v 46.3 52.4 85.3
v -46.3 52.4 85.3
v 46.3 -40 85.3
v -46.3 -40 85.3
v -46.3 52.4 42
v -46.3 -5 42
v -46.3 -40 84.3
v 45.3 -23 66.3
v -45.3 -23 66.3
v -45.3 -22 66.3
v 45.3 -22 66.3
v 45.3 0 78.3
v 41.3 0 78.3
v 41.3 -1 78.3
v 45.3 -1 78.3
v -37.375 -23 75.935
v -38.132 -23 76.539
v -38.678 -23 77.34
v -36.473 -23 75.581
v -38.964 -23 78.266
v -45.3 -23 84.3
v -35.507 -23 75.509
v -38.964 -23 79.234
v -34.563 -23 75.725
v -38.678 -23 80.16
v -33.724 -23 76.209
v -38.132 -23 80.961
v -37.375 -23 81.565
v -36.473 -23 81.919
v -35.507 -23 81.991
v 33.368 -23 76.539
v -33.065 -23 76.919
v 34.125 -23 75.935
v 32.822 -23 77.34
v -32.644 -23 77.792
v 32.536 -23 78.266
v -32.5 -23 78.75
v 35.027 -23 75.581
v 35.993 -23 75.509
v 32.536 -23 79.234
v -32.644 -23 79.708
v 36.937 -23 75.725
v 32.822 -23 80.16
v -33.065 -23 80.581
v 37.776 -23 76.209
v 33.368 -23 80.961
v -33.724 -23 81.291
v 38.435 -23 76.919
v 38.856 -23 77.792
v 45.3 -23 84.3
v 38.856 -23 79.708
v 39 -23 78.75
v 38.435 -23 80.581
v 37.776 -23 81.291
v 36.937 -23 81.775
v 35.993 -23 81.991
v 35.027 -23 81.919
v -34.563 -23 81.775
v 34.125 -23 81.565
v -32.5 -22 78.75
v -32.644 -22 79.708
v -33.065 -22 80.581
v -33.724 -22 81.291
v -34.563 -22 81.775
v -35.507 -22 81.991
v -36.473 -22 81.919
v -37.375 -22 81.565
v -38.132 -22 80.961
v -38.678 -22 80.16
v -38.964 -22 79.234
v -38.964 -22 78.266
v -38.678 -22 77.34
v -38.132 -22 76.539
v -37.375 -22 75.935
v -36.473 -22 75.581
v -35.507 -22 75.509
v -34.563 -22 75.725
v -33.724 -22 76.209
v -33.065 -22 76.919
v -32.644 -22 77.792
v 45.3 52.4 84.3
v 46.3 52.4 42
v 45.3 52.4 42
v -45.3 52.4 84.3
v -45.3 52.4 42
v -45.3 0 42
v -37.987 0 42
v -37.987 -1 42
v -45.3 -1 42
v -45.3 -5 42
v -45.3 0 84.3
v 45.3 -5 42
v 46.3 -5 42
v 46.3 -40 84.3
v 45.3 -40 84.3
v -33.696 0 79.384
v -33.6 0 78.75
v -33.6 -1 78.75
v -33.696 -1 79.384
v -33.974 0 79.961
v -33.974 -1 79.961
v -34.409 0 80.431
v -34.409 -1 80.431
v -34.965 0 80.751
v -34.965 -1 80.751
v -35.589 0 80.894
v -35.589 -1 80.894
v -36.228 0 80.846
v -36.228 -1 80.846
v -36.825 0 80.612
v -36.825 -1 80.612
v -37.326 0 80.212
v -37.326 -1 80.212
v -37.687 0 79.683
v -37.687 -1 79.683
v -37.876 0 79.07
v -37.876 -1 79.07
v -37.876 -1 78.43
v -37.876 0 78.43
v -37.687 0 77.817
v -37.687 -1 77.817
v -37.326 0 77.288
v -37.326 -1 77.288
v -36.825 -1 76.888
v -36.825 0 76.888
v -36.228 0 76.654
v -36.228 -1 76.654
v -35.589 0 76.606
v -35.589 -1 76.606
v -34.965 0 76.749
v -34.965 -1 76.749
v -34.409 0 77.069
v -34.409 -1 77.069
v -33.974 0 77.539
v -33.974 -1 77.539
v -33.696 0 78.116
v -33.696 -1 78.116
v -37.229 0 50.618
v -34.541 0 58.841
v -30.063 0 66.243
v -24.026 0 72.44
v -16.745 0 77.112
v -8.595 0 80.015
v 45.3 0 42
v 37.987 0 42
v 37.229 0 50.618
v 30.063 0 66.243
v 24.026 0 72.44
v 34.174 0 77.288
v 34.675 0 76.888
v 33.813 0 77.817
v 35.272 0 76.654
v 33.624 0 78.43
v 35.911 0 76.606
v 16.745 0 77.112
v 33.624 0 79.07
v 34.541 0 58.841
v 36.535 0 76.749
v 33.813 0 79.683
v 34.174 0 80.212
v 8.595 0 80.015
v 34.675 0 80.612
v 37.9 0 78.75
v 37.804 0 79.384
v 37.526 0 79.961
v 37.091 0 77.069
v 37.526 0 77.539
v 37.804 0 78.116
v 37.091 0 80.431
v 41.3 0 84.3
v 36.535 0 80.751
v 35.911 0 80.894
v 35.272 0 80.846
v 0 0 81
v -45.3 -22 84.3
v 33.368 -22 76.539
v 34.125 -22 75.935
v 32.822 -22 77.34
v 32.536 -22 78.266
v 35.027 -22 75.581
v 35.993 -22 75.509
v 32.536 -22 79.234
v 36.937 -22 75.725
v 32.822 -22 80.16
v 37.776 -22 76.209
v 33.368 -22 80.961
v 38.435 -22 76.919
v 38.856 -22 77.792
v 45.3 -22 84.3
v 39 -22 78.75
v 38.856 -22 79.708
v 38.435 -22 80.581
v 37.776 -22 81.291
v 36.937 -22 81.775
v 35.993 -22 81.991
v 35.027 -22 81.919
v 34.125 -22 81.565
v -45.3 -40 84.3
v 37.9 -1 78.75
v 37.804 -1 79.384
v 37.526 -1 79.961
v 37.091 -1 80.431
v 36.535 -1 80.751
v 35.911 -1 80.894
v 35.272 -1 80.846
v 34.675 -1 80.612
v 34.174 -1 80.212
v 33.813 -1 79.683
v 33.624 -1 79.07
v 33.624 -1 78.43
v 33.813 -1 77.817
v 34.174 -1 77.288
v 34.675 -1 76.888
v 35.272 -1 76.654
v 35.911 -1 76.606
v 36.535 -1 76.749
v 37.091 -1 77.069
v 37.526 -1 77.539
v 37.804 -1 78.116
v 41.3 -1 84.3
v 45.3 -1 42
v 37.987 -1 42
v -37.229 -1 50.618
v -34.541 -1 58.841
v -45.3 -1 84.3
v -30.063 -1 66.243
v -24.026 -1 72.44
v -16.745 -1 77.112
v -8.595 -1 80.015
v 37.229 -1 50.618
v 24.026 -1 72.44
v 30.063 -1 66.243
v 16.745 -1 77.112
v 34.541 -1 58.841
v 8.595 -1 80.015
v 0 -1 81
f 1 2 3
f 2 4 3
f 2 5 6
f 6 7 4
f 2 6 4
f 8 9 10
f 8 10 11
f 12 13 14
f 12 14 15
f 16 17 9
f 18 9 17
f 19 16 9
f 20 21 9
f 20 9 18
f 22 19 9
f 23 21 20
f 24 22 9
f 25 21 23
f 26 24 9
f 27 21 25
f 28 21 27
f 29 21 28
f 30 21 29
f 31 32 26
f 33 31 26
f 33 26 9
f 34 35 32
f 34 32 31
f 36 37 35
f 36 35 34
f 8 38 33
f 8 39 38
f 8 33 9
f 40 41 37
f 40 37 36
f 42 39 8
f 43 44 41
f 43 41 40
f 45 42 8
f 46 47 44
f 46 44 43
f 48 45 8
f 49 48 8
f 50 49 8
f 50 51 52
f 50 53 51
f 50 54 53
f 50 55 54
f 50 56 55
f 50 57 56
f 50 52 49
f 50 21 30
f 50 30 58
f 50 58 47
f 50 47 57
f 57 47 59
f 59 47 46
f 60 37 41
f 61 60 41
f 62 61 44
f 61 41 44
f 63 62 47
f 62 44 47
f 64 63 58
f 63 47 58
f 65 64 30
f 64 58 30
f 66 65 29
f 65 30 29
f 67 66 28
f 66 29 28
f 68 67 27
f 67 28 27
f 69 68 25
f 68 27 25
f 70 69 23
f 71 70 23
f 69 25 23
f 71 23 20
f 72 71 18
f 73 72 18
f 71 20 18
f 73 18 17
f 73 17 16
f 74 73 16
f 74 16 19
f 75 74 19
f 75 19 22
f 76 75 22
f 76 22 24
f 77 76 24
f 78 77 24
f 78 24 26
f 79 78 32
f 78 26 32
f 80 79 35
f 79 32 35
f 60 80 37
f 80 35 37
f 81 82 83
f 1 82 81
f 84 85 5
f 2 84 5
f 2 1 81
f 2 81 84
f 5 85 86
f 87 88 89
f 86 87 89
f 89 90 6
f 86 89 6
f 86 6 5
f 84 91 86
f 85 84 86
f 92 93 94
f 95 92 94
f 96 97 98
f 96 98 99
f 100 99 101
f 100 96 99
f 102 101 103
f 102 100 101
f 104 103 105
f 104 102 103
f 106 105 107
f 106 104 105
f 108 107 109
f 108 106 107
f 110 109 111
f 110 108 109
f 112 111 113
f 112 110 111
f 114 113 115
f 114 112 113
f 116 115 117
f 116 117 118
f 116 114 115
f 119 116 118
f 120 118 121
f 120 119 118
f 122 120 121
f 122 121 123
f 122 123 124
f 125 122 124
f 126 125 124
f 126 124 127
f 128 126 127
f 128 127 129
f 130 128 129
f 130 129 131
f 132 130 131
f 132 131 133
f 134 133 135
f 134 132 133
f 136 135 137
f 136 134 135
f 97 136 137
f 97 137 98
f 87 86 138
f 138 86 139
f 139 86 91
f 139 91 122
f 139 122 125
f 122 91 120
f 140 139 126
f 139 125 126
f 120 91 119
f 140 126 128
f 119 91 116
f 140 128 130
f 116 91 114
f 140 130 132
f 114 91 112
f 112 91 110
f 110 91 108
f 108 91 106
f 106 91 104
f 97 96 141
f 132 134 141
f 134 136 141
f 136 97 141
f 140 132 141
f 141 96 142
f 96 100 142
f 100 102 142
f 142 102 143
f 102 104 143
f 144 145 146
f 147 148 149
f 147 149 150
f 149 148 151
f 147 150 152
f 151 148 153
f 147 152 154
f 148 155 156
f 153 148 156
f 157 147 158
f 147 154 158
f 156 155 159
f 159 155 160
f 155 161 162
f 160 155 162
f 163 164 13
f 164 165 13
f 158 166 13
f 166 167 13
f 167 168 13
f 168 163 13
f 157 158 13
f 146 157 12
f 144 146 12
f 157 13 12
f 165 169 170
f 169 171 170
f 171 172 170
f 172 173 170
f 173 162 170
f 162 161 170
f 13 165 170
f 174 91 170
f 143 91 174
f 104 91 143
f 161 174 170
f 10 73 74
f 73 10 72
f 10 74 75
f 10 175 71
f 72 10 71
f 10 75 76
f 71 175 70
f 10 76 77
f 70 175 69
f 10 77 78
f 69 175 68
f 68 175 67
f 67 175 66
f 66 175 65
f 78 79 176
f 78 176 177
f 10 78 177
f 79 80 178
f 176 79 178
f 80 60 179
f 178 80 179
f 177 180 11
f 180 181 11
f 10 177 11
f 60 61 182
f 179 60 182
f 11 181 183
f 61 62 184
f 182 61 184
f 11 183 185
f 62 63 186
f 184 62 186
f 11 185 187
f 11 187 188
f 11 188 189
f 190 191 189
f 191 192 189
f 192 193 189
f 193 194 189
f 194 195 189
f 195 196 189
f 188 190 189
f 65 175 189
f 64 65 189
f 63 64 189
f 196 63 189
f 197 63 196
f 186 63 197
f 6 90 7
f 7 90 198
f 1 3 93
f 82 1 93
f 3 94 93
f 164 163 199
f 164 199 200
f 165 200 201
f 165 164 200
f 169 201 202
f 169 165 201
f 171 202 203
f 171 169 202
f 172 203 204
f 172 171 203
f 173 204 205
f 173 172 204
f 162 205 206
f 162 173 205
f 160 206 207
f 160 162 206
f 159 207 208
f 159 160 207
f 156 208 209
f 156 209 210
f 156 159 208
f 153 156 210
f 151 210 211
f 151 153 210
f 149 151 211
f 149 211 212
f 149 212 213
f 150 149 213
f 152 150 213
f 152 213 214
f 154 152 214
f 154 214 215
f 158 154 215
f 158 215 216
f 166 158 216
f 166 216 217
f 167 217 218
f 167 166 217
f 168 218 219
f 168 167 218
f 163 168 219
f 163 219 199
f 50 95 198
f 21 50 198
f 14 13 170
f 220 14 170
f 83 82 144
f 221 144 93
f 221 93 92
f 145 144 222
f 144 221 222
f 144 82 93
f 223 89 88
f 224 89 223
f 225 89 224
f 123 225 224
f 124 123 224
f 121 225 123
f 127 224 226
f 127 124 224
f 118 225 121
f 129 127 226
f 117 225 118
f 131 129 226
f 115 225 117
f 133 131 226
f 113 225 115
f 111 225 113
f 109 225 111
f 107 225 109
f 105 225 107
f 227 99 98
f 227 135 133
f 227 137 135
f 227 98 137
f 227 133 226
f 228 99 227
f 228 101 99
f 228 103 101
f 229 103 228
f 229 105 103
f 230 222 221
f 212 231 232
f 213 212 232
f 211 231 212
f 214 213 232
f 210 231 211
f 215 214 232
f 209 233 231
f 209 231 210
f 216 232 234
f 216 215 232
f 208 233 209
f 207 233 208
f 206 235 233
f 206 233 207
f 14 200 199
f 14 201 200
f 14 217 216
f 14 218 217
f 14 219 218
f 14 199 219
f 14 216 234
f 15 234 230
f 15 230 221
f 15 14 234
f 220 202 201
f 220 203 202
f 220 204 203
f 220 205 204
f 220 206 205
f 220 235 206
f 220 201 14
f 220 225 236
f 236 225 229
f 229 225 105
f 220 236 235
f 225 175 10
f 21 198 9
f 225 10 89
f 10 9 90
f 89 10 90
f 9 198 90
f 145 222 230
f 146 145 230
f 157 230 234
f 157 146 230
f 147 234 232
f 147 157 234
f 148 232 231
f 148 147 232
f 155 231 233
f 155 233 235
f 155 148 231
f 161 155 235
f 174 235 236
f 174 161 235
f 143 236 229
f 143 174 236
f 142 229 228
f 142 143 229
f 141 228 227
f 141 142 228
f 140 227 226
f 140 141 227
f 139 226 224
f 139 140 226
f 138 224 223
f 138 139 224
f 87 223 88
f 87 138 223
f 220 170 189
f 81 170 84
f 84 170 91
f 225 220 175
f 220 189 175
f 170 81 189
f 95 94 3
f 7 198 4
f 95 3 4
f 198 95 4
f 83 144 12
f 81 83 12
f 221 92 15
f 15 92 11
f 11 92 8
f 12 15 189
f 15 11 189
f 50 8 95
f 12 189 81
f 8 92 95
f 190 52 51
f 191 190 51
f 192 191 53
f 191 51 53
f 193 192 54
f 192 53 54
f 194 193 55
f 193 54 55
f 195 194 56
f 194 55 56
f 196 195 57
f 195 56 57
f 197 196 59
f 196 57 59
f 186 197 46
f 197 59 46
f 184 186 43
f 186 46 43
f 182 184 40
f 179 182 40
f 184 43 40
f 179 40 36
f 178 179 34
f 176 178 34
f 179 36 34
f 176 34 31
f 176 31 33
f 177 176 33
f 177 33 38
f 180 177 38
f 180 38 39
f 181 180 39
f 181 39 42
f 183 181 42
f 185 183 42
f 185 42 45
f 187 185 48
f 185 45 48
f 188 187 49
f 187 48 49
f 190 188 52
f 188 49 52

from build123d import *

# Parameters (mm, degrees)
PAD027_DEPTH    = 40
PAD028_DEPTH    = 52.4
SKETCH048_W     = 90.6
SKETCH048_H     = 42.3
PAD029_DEPTH    = 1
SKETCH049_R     = 38
POCKET015_DEPTH = 1
POCKET016_DEPTH = 46.3
SKETCH051_R     = 2.15
POCKET017_DEPTH = 1
SKETCH063_W     = 90.6
SKETCH063_H     = 1
PAD033_DEPTH    = 18
SKETCH069_R     = 3.25
POCKET028_DEPTH = 1
SKETCH071_W     = 4
SKETCH071_H     = 6
POCKET030_DEPTH = 1


with BuildPart() as part:
    # Sketch047 → Pad027 (new body)
    with BuildSketch(Plane.XZ):
        Polygon((-45.3, 42), (-46.3, 42), (-46.3, 85.3), (46.3, 85.3), (46.3, 42), (45.3, 42), (45.3, 84.3), (-45.3, 84.3), align=None)
    extrude(amount=PAD027_DEPTH)

    # Sketch047 → Pad028 (join)
    with BuildSketch(Plane.XZ):
        Polygon((-45.3, 42), (-46.3, 42), (-46.3, 85.3), (46.3, 85.3), (46.3, 42), (45.3, 42), (45.3, 84.3), (-45.3, 84.3), align=None)
    extrude(amount=-PAD028_DEPTH)

    # Sketch048 → Pad029 (join)
    with BuildSketch(Plane.XZ):
        with Locations((0, 63.15)):
            Rectangle(SKETCH048_W, SKETCH048_H)
    extrude(amount=PAD029_DEPTH)

    # Sketch049 → Pocket015 (cut)
    with BuildSketch(Plane.XZ):
        with Locations((0, 43)):
            Circle(SKETCH049_R)
    extrude(amount=POCKET015_DEPTH, mode=Mode.SUBTRACT)

    # Sketch050 → Pocket016 (cut, symmetric)
    with BuildSketch(Plane.YZ):
        Polygon((-5, 42), (-40, 84.3), (-40, 42), align=None)
    extrude(amount=POCKET016_DEPTH, both=True, mode=Mode.SUBTRACT)

    # Sketch051 → Pocket017 (cut)
    with BuildSketch(Plane.XZ):
        with Locations((-35.75, 78.75)):
            Circle(SKETCH051_R)
        with Locations((35.75, 78.75)):
            Circle(SKETCH051_R)
    extrude(amount=POCKET017_DEPTH, mode=Mode.SUBTRACT)

    # Sketch063 (on Face12 of Pocket017) → Pad033 (join)
    with BuildSketch(Plane(origin=(0, 0, 84.3), x_dir=(1, 0, 0), z_dir=(0, 0, -1))):
        with Locations((0, 22.5)):
            Rectangle(SKETCH063_W, SKETCH063_H)
    extrude(amount=PAD033_DEPTH)

    # Sketch069 (on Face13 of Pad033) → Pocket028 (cut)
    with BuildSketch(Plane.XZ.offset(23)):
        with Locations((-35.75, 78.75)):
            Circle(SKETCH069_R)
        with Locations((35.75, 78.75)):
            Circle(SKETCH069_R)
    extrude(amount=-POCKET028_DEPTH, mode=Mode.SUBTRACT)

    # Sketch071 → Pocket030 (cut)
    with BuildSketch(Plane.XZ):
        with Locations((43.3, 81.3)):
            Rectangle(SKETCH071_W, SKETCH071_H)
    extrude(amount=POCKET030_DEPTH, mode=Mode.SUBTRACT)


solid = part.part
